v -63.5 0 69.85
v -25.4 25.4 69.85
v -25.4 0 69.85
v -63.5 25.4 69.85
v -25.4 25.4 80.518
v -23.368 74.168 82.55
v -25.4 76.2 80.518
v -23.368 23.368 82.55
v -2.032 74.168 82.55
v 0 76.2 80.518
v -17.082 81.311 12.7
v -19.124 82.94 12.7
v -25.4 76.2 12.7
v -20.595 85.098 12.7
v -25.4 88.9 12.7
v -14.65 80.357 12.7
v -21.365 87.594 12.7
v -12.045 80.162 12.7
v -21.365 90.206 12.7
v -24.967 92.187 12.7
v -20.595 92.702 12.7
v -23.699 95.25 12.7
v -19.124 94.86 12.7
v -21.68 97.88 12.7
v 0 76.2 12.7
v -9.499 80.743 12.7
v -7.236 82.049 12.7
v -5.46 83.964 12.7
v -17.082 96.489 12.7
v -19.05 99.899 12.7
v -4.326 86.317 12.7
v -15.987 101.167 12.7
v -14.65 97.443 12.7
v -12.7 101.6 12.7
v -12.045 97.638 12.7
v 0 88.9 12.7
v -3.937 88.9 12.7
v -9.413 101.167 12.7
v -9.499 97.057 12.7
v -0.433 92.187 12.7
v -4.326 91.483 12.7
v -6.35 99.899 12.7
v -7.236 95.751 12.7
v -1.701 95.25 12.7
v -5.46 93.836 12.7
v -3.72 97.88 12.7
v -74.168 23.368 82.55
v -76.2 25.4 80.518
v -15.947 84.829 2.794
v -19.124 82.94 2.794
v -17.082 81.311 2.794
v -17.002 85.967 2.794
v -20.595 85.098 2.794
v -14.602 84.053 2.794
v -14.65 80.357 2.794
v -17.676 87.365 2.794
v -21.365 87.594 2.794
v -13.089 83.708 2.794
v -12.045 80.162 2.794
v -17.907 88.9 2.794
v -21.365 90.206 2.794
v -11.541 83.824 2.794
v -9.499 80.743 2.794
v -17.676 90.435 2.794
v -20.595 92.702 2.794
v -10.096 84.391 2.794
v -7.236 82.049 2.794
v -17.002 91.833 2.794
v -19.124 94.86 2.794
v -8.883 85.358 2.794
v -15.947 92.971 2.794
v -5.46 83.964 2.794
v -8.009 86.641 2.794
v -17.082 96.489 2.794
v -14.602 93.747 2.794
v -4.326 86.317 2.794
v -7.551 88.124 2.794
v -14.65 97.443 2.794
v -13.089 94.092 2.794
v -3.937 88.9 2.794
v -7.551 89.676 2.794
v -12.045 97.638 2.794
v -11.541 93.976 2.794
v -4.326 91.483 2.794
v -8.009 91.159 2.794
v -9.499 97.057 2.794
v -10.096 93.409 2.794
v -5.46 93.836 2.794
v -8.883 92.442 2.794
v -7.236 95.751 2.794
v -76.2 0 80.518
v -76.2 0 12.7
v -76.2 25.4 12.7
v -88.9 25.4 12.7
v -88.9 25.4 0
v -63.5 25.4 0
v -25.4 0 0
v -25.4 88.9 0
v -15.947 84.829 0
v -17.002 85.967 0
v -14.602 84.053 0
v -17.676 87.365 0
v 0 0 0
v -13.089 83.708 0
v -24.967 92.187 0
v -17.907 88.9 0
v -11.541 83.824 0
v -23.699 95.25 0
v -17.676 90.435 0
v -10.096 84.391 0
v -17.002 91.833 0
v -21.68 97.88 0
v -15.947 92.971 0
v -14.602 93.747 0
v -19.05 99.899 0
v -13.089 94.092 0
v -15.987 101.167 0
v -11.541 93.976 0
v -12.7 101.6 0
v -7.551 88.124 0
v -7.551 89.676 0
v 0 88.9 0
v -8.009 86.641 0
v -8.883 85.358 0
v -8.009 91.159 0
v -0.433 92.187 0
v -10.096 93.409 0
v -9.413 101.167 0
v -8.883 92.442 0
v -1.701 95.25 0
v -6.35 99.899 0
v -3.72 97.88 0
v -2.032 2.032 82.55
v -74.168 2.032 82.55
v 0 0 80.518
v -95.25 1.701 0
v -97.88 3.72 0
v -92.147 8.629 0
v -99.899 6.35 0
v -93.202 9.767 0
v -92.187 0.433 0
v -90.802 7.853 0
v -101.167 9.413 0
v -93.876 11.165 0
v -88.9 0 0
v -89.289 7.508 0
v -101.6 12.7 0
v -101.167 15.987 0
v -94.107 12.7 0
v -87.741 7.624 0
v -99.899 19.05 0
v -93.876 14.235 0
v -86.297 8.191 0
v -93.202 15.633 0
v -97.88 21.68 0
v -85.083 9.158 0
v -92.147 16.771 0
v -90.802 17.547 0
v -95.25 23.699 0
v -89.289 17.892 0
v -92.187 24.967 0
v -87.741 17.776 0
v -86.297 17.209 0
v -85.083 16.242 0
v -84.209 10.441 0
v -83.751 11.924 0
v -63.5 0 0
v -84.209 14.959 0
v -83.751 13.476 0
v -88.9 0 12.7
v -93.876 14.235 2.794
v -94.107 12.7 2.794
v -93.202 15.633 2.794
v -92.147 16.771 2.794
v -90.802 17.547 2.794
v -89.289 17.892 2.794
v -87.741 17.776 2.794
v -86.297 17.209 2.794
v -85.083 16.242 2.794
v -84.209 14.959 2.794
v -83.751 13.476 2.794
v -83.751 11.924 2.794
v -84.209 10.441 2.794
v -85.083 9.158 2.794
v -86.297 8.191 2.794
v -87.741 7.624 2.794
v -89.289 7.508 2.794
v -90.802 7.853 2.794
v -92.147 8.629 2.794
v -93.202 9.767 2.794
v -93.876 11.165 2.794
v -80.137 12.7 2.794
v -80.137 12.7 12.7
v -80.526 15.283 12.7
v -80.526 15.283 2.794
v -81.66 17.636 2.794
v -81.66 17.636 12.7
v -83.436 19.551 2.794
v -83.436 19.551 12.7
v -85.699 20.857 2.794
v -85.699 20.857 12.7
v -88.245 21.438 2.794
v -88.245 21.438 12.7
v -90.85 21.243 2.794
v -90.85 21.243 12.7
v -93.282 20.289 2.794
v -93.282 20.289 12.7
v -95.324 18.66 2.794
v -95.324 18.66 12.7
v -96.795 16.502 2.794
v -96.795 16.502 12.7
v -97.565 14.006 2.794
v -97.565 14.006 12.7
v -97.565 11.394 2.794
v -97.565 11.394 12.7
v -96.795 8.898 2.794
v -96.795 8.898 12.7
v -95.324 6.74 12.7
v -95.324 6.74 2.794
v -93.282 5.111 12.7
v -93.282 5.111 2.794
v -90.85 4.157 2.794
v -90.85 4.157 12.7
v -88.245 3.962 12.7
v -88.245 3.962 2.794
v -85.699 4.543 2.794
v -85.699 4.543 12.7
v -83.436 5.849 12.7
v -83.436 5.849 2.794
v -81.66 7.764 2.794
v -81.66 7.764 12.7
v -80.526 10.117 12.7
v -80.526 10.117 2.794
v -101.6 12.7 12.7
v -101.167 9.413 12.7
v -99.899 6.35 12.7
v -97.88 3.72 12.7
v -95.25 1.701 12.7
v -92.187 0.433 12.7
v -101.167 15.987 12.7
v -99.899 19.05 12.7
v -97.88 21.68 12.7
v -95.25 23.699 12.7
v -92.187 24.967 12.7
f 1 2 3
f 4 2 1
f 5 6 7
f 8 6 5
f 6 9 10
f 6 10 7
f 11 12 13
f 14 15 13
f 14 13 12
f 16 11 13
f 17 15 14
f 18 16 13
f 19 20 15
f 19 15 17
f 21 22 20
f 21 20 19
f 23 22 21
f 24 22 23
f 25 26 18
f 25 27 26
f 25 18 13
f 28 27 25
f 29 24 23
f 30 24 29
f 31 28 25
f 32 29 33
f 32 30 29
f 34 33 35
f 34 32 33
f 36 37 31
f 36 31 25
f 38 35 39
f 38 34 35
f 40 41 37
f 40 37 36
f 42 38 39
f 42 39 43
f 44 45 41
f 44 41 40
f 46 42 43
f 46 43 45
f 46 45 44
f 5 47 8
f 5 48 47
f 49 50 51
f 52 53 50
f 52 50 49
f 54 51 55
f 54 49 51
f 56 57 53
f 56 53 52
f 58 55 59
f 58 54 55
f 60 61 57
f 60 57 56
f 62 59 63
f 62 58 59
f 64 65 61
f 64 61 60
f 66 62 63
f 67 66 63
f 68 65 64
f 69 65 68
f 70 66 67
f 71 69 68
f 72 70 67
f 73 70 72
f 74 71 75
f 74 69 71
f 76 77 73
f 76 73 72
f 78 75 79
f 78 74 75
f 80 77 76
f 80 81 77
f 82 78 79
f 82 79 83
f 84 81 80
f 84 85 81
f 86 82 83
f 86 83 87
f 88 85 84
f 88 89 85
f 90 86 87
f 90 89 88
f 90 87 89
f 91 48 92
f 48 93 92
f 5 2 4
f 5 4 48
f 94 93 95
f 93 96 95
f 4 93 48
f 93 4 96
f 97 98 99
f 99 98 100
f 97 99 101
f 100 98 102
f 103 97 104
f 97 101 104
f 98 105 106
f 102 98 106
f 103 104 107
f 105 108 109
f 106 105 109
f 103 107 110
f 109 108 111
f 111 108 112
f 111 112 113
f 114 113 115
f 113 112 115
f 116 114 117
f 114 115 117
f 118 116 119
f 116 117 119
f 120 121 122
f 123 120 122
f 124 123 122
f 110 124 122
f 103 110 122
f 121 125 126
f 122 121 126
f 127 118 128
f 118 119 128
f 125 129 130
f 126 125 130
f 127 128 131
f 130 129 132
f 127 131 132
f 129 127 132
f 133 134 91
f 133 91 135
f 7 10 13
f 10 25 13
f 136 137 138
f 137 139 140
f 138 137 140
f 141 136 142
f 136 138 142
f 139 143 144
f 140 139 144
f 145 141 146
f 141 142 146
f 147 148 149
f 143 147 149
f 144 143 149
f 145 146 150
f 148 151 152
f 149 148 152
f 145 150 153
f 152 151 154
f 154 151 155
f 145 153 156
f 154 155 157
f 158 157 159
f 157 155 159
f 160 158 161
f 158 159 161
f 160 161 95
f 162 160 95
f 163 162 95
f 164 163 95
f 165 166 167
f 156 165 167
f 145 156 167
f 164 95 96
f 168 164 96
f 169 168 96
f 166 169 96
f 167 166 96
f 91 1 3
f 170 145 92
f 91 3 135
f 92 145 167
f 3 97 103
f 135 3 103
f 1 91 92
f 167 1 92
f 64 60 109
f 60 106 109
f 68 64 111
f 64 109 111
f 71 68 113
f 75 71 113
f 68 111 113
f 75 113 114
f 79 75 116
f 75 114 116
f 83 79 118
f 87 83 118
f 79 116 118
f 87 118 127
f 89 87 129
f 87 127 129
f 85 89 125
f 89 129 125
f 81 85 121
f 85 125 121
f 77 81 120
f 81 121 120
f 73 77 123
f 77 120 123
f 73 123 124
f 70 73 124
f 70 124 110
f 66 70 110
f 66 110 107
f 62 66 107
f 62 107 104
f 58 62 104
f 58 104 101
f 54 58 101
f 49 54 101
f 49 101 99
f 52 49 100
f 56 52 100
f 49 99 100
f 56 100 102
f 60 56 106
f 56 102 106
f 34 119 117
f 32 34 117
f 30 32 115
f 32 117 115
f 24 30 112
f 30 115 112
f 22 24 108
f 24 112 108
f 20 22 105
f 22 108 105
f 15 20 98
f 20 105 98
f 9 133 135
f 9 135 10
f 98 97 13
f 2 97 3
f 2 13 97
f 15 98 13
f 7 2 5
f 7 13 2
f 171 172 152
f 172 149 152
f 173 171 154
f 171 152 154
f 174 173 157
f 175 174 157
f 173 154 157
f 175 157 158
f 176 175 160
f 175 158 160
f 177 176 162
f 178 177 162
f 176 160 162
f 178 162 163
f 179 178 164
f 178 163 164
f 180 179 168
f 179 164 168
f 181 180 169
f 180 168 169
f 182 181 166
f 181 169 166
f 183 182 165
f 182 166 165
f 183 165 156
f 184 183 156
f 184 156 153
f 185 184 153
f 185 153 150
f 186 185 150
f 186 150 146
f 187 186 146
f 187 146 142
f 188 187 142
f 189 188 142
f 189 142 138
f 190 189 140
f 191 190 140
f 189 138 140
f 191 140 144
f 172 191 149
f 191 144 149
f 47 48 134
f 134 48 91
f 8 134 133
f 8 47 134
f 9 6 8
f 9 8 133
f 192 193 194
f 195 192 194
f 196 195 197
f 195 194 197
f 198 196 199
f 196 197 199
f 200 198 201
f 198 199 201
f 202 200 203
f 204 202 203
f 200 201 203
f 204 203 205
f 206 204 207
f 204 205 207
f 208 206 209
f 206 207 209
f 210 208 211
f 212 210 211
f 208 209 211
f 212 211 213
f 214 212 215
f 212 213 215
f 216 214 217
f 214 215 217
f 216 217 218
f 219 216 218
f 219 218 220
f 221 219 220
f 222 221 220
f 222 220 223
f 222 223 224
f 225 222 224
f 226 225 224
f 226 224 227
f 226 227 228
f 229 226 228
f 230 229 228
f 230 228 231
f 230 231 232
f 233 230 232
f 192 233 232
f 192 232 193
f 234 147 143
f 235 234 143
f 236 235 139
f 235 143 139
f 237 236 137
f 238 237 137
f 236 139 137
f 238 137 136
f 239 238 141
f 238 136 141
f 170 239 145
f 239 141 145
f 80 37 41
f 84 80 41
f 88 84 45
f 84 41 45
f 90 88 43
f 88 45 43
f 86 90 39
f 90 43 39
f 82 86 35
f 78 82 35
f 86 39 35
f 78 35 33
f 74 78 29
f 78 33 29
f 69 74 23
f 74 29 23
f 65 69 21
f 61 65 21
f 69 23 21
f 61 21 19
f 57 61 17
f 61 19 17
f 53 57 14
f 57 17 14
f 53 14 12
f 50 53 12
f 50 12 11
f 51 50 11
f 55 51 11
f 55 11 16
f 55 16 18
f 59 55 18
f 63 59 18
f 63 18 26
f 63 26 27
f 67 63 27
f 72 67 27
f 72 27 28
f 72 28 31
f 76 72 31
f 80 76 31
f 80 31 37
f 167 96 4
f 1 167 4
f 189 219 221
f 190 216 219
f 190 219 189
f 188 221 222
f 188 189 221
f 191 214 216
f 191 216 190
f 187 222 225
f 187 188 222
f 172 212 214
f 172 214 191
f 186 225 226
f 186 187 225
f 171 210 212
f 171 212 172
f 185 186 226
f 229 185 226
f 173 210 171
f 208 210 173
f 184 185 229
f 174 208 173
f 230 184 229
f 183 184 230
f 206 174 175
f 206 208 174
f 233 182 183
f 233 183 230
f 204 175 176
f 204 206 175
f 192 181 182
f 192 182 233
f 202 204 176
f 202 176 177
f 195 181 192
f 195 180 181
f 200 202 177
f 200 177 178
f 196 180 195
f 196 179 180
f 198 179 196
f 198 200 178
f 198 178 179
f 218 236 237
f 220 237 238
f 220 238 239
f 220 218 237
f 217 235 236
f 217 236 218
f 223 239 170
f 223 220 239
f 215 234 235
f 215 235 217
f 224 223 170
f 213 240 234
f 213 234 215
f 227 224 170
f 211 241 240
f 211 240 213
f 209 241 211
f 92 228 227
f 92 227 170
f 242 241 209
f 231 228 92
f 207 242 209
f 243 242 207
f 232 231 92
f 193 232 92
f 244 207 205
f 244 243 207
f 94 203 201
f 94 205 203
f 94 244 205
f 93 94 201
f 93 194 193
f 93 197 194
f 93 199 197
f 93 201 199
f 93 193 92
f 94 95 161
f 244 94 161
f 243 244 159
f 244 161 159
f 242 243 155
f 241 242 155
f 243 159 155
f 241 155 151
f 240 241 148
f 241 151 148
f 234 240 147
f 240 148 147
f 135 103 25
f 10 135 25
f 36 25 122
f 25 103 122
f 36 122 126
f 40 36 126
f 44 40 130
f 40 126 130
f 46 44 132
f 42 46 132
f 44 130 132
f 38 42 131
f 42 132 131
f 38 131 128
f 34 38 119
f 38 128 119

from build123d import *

# Parameters (mm, degrees)
F1_DEPTH       = 82.55
F2_DEPTH       = 12.7
F4_D           = 10.414
F4_CBORE_D     = 17.526
F4_CBORE_DEPTH = 9.906
F6_D           = 10.414
F6_CBORE_D     = 17.526
F6_CBORE_DEPTH = 9.906
F7_W           = 38.1
F7_H           = 69.85
F8_DEPTH       = 25.4
F9_SIZE        = 2.032
F10_SIZE       = 2.032
F11_SIZE       = 2.032
F12_SIZE       = 2.032
F13_SIZE       = 2.032
F14_SIZE       = 2.032


with BuildPart() as f1:
    # F0 (on Top) → F1 (new body)
    with BuildSketch(Plane.XY):
        Polygon((-72.4953562021, 0), (0, 0), (0, 76.2), (-25.4, 76.2), (-25.4, 25.4), (-63.5, 25.4), (-76.2, 25.4), (-76.2, 0), align=None)
    extrude(amount=F1_DEPTH)

    # F0 (on Top) → F2 (join)
    with BuildSketch(Plane.XY):
        Polygon((-72.4953562021, 0), (0, 0), (0, 76.2), (-25.4, 76.2), (-25.4, 25.4), (-63.5, 25.4), (-76.2, 25.4), (-76.2, 0), align=None)
        with BuildLine():
            Line((-25.4, 76.2), (0, 76.2))
            Line((0, 76.2), (0, 88.9))
            ThreePointArc((0, 88.9), (-3.7197438789, 97.8802561211), (-12.7, 101.6))
            ThreePointArc((-12.7, 101.6), (-21.6802561211, 97.8802561211), (-25.4, 88.9))
            Line((-25.4, 88.9), (-25.4, 76.2))
        make_face()
        with BuildLine():
            Line((-88.9, 0), (-76.2, 0))
            Line((-76.2, 0), (-76.2, 25.4))
            Line((-76.2, 25.4), (-88.9, 25.4))
            ThreePointArc((-88.9, 25.4), (-97.8802561211, 21.6802561211), (-101.6, 12.7))
            ThreePointArc((-101.6, 12.7), (-97.8802561211, 3.7197438789), (-88.9, 0))
        make_face()
    extrude(amount=F2_DEPTH)

    # F4 (through all)
    with Locations(Plane.XY.offset(12.7)):
        with Locations((-12.7, 88.9)):
            CounterBoreHole(F4_D / 2, F4_CBORE_D / 2, F4_CBORE_DEPTH)

    # F6 (through all)
    with Locations(Plane.XY.offset(12.7)):
        with Locations((-88.9, 12.7)):
            CounterBoreHole(F6_D / 2, F6_CBORE_D / 2, F6_CBORE_DEPTH)

    # F7 (on face) → F8 (cut)
    with BuildSketch(Plane(origin=(0, 25.4, 0), x_dir=(-1, 0, 0), z_dir=(0, 1, 0))):
        with Locations((44.45, 34.925)):
            Rectangle(F7_W, F7_H)
    extrude(amount=-F8_DEPTH, mode=Mode.SUBTRACT)

    # F9
    f9_edges = [f1.edges().sort_by_distance(p)[0] for p in [
        (0, 38.1, 82.55),
    ]]
    chamfer(f9_edges, length=F9_SIZE)

    # F10
    f10_edges = [f1.edges().sort_by_distance(p)[0] for p in [
        (-39.116, 0, 82.55),
    ]]
    chamfer(f10_edges, length=F10_SIZE)

    # F11
    f11_edges = [f1.edges().sort_by_distance(p)[0] for p in [
        (-25.4, 50.8, 82.55),
    ]]
    chamfer(f11_edges, length=F11_SIZE)

    # F12
    f12_edges = [f1.edges().sort_by_distance(p)[0] for p in [
        (-50.8, 25.4, 82.55),
    ]]
    chamfer(f12_edges, length=F12_SIZE)

    # F13
    f13_edges = [f1.edges().sort_by_distance(p)[0] for p in [
        (-12.7, 76.2, 82.55),
    ]]
    chamfer(f13_edges, length=F13_SIZE)

    # F14
    f14_edges = [f1.edges().sort_by_distance(p)[0] for p in [
        (-76.2, 12.7, 82.55),
    ]]
    chamfer(f14_edges, length=F14_SIZE)


solid = f1.part
